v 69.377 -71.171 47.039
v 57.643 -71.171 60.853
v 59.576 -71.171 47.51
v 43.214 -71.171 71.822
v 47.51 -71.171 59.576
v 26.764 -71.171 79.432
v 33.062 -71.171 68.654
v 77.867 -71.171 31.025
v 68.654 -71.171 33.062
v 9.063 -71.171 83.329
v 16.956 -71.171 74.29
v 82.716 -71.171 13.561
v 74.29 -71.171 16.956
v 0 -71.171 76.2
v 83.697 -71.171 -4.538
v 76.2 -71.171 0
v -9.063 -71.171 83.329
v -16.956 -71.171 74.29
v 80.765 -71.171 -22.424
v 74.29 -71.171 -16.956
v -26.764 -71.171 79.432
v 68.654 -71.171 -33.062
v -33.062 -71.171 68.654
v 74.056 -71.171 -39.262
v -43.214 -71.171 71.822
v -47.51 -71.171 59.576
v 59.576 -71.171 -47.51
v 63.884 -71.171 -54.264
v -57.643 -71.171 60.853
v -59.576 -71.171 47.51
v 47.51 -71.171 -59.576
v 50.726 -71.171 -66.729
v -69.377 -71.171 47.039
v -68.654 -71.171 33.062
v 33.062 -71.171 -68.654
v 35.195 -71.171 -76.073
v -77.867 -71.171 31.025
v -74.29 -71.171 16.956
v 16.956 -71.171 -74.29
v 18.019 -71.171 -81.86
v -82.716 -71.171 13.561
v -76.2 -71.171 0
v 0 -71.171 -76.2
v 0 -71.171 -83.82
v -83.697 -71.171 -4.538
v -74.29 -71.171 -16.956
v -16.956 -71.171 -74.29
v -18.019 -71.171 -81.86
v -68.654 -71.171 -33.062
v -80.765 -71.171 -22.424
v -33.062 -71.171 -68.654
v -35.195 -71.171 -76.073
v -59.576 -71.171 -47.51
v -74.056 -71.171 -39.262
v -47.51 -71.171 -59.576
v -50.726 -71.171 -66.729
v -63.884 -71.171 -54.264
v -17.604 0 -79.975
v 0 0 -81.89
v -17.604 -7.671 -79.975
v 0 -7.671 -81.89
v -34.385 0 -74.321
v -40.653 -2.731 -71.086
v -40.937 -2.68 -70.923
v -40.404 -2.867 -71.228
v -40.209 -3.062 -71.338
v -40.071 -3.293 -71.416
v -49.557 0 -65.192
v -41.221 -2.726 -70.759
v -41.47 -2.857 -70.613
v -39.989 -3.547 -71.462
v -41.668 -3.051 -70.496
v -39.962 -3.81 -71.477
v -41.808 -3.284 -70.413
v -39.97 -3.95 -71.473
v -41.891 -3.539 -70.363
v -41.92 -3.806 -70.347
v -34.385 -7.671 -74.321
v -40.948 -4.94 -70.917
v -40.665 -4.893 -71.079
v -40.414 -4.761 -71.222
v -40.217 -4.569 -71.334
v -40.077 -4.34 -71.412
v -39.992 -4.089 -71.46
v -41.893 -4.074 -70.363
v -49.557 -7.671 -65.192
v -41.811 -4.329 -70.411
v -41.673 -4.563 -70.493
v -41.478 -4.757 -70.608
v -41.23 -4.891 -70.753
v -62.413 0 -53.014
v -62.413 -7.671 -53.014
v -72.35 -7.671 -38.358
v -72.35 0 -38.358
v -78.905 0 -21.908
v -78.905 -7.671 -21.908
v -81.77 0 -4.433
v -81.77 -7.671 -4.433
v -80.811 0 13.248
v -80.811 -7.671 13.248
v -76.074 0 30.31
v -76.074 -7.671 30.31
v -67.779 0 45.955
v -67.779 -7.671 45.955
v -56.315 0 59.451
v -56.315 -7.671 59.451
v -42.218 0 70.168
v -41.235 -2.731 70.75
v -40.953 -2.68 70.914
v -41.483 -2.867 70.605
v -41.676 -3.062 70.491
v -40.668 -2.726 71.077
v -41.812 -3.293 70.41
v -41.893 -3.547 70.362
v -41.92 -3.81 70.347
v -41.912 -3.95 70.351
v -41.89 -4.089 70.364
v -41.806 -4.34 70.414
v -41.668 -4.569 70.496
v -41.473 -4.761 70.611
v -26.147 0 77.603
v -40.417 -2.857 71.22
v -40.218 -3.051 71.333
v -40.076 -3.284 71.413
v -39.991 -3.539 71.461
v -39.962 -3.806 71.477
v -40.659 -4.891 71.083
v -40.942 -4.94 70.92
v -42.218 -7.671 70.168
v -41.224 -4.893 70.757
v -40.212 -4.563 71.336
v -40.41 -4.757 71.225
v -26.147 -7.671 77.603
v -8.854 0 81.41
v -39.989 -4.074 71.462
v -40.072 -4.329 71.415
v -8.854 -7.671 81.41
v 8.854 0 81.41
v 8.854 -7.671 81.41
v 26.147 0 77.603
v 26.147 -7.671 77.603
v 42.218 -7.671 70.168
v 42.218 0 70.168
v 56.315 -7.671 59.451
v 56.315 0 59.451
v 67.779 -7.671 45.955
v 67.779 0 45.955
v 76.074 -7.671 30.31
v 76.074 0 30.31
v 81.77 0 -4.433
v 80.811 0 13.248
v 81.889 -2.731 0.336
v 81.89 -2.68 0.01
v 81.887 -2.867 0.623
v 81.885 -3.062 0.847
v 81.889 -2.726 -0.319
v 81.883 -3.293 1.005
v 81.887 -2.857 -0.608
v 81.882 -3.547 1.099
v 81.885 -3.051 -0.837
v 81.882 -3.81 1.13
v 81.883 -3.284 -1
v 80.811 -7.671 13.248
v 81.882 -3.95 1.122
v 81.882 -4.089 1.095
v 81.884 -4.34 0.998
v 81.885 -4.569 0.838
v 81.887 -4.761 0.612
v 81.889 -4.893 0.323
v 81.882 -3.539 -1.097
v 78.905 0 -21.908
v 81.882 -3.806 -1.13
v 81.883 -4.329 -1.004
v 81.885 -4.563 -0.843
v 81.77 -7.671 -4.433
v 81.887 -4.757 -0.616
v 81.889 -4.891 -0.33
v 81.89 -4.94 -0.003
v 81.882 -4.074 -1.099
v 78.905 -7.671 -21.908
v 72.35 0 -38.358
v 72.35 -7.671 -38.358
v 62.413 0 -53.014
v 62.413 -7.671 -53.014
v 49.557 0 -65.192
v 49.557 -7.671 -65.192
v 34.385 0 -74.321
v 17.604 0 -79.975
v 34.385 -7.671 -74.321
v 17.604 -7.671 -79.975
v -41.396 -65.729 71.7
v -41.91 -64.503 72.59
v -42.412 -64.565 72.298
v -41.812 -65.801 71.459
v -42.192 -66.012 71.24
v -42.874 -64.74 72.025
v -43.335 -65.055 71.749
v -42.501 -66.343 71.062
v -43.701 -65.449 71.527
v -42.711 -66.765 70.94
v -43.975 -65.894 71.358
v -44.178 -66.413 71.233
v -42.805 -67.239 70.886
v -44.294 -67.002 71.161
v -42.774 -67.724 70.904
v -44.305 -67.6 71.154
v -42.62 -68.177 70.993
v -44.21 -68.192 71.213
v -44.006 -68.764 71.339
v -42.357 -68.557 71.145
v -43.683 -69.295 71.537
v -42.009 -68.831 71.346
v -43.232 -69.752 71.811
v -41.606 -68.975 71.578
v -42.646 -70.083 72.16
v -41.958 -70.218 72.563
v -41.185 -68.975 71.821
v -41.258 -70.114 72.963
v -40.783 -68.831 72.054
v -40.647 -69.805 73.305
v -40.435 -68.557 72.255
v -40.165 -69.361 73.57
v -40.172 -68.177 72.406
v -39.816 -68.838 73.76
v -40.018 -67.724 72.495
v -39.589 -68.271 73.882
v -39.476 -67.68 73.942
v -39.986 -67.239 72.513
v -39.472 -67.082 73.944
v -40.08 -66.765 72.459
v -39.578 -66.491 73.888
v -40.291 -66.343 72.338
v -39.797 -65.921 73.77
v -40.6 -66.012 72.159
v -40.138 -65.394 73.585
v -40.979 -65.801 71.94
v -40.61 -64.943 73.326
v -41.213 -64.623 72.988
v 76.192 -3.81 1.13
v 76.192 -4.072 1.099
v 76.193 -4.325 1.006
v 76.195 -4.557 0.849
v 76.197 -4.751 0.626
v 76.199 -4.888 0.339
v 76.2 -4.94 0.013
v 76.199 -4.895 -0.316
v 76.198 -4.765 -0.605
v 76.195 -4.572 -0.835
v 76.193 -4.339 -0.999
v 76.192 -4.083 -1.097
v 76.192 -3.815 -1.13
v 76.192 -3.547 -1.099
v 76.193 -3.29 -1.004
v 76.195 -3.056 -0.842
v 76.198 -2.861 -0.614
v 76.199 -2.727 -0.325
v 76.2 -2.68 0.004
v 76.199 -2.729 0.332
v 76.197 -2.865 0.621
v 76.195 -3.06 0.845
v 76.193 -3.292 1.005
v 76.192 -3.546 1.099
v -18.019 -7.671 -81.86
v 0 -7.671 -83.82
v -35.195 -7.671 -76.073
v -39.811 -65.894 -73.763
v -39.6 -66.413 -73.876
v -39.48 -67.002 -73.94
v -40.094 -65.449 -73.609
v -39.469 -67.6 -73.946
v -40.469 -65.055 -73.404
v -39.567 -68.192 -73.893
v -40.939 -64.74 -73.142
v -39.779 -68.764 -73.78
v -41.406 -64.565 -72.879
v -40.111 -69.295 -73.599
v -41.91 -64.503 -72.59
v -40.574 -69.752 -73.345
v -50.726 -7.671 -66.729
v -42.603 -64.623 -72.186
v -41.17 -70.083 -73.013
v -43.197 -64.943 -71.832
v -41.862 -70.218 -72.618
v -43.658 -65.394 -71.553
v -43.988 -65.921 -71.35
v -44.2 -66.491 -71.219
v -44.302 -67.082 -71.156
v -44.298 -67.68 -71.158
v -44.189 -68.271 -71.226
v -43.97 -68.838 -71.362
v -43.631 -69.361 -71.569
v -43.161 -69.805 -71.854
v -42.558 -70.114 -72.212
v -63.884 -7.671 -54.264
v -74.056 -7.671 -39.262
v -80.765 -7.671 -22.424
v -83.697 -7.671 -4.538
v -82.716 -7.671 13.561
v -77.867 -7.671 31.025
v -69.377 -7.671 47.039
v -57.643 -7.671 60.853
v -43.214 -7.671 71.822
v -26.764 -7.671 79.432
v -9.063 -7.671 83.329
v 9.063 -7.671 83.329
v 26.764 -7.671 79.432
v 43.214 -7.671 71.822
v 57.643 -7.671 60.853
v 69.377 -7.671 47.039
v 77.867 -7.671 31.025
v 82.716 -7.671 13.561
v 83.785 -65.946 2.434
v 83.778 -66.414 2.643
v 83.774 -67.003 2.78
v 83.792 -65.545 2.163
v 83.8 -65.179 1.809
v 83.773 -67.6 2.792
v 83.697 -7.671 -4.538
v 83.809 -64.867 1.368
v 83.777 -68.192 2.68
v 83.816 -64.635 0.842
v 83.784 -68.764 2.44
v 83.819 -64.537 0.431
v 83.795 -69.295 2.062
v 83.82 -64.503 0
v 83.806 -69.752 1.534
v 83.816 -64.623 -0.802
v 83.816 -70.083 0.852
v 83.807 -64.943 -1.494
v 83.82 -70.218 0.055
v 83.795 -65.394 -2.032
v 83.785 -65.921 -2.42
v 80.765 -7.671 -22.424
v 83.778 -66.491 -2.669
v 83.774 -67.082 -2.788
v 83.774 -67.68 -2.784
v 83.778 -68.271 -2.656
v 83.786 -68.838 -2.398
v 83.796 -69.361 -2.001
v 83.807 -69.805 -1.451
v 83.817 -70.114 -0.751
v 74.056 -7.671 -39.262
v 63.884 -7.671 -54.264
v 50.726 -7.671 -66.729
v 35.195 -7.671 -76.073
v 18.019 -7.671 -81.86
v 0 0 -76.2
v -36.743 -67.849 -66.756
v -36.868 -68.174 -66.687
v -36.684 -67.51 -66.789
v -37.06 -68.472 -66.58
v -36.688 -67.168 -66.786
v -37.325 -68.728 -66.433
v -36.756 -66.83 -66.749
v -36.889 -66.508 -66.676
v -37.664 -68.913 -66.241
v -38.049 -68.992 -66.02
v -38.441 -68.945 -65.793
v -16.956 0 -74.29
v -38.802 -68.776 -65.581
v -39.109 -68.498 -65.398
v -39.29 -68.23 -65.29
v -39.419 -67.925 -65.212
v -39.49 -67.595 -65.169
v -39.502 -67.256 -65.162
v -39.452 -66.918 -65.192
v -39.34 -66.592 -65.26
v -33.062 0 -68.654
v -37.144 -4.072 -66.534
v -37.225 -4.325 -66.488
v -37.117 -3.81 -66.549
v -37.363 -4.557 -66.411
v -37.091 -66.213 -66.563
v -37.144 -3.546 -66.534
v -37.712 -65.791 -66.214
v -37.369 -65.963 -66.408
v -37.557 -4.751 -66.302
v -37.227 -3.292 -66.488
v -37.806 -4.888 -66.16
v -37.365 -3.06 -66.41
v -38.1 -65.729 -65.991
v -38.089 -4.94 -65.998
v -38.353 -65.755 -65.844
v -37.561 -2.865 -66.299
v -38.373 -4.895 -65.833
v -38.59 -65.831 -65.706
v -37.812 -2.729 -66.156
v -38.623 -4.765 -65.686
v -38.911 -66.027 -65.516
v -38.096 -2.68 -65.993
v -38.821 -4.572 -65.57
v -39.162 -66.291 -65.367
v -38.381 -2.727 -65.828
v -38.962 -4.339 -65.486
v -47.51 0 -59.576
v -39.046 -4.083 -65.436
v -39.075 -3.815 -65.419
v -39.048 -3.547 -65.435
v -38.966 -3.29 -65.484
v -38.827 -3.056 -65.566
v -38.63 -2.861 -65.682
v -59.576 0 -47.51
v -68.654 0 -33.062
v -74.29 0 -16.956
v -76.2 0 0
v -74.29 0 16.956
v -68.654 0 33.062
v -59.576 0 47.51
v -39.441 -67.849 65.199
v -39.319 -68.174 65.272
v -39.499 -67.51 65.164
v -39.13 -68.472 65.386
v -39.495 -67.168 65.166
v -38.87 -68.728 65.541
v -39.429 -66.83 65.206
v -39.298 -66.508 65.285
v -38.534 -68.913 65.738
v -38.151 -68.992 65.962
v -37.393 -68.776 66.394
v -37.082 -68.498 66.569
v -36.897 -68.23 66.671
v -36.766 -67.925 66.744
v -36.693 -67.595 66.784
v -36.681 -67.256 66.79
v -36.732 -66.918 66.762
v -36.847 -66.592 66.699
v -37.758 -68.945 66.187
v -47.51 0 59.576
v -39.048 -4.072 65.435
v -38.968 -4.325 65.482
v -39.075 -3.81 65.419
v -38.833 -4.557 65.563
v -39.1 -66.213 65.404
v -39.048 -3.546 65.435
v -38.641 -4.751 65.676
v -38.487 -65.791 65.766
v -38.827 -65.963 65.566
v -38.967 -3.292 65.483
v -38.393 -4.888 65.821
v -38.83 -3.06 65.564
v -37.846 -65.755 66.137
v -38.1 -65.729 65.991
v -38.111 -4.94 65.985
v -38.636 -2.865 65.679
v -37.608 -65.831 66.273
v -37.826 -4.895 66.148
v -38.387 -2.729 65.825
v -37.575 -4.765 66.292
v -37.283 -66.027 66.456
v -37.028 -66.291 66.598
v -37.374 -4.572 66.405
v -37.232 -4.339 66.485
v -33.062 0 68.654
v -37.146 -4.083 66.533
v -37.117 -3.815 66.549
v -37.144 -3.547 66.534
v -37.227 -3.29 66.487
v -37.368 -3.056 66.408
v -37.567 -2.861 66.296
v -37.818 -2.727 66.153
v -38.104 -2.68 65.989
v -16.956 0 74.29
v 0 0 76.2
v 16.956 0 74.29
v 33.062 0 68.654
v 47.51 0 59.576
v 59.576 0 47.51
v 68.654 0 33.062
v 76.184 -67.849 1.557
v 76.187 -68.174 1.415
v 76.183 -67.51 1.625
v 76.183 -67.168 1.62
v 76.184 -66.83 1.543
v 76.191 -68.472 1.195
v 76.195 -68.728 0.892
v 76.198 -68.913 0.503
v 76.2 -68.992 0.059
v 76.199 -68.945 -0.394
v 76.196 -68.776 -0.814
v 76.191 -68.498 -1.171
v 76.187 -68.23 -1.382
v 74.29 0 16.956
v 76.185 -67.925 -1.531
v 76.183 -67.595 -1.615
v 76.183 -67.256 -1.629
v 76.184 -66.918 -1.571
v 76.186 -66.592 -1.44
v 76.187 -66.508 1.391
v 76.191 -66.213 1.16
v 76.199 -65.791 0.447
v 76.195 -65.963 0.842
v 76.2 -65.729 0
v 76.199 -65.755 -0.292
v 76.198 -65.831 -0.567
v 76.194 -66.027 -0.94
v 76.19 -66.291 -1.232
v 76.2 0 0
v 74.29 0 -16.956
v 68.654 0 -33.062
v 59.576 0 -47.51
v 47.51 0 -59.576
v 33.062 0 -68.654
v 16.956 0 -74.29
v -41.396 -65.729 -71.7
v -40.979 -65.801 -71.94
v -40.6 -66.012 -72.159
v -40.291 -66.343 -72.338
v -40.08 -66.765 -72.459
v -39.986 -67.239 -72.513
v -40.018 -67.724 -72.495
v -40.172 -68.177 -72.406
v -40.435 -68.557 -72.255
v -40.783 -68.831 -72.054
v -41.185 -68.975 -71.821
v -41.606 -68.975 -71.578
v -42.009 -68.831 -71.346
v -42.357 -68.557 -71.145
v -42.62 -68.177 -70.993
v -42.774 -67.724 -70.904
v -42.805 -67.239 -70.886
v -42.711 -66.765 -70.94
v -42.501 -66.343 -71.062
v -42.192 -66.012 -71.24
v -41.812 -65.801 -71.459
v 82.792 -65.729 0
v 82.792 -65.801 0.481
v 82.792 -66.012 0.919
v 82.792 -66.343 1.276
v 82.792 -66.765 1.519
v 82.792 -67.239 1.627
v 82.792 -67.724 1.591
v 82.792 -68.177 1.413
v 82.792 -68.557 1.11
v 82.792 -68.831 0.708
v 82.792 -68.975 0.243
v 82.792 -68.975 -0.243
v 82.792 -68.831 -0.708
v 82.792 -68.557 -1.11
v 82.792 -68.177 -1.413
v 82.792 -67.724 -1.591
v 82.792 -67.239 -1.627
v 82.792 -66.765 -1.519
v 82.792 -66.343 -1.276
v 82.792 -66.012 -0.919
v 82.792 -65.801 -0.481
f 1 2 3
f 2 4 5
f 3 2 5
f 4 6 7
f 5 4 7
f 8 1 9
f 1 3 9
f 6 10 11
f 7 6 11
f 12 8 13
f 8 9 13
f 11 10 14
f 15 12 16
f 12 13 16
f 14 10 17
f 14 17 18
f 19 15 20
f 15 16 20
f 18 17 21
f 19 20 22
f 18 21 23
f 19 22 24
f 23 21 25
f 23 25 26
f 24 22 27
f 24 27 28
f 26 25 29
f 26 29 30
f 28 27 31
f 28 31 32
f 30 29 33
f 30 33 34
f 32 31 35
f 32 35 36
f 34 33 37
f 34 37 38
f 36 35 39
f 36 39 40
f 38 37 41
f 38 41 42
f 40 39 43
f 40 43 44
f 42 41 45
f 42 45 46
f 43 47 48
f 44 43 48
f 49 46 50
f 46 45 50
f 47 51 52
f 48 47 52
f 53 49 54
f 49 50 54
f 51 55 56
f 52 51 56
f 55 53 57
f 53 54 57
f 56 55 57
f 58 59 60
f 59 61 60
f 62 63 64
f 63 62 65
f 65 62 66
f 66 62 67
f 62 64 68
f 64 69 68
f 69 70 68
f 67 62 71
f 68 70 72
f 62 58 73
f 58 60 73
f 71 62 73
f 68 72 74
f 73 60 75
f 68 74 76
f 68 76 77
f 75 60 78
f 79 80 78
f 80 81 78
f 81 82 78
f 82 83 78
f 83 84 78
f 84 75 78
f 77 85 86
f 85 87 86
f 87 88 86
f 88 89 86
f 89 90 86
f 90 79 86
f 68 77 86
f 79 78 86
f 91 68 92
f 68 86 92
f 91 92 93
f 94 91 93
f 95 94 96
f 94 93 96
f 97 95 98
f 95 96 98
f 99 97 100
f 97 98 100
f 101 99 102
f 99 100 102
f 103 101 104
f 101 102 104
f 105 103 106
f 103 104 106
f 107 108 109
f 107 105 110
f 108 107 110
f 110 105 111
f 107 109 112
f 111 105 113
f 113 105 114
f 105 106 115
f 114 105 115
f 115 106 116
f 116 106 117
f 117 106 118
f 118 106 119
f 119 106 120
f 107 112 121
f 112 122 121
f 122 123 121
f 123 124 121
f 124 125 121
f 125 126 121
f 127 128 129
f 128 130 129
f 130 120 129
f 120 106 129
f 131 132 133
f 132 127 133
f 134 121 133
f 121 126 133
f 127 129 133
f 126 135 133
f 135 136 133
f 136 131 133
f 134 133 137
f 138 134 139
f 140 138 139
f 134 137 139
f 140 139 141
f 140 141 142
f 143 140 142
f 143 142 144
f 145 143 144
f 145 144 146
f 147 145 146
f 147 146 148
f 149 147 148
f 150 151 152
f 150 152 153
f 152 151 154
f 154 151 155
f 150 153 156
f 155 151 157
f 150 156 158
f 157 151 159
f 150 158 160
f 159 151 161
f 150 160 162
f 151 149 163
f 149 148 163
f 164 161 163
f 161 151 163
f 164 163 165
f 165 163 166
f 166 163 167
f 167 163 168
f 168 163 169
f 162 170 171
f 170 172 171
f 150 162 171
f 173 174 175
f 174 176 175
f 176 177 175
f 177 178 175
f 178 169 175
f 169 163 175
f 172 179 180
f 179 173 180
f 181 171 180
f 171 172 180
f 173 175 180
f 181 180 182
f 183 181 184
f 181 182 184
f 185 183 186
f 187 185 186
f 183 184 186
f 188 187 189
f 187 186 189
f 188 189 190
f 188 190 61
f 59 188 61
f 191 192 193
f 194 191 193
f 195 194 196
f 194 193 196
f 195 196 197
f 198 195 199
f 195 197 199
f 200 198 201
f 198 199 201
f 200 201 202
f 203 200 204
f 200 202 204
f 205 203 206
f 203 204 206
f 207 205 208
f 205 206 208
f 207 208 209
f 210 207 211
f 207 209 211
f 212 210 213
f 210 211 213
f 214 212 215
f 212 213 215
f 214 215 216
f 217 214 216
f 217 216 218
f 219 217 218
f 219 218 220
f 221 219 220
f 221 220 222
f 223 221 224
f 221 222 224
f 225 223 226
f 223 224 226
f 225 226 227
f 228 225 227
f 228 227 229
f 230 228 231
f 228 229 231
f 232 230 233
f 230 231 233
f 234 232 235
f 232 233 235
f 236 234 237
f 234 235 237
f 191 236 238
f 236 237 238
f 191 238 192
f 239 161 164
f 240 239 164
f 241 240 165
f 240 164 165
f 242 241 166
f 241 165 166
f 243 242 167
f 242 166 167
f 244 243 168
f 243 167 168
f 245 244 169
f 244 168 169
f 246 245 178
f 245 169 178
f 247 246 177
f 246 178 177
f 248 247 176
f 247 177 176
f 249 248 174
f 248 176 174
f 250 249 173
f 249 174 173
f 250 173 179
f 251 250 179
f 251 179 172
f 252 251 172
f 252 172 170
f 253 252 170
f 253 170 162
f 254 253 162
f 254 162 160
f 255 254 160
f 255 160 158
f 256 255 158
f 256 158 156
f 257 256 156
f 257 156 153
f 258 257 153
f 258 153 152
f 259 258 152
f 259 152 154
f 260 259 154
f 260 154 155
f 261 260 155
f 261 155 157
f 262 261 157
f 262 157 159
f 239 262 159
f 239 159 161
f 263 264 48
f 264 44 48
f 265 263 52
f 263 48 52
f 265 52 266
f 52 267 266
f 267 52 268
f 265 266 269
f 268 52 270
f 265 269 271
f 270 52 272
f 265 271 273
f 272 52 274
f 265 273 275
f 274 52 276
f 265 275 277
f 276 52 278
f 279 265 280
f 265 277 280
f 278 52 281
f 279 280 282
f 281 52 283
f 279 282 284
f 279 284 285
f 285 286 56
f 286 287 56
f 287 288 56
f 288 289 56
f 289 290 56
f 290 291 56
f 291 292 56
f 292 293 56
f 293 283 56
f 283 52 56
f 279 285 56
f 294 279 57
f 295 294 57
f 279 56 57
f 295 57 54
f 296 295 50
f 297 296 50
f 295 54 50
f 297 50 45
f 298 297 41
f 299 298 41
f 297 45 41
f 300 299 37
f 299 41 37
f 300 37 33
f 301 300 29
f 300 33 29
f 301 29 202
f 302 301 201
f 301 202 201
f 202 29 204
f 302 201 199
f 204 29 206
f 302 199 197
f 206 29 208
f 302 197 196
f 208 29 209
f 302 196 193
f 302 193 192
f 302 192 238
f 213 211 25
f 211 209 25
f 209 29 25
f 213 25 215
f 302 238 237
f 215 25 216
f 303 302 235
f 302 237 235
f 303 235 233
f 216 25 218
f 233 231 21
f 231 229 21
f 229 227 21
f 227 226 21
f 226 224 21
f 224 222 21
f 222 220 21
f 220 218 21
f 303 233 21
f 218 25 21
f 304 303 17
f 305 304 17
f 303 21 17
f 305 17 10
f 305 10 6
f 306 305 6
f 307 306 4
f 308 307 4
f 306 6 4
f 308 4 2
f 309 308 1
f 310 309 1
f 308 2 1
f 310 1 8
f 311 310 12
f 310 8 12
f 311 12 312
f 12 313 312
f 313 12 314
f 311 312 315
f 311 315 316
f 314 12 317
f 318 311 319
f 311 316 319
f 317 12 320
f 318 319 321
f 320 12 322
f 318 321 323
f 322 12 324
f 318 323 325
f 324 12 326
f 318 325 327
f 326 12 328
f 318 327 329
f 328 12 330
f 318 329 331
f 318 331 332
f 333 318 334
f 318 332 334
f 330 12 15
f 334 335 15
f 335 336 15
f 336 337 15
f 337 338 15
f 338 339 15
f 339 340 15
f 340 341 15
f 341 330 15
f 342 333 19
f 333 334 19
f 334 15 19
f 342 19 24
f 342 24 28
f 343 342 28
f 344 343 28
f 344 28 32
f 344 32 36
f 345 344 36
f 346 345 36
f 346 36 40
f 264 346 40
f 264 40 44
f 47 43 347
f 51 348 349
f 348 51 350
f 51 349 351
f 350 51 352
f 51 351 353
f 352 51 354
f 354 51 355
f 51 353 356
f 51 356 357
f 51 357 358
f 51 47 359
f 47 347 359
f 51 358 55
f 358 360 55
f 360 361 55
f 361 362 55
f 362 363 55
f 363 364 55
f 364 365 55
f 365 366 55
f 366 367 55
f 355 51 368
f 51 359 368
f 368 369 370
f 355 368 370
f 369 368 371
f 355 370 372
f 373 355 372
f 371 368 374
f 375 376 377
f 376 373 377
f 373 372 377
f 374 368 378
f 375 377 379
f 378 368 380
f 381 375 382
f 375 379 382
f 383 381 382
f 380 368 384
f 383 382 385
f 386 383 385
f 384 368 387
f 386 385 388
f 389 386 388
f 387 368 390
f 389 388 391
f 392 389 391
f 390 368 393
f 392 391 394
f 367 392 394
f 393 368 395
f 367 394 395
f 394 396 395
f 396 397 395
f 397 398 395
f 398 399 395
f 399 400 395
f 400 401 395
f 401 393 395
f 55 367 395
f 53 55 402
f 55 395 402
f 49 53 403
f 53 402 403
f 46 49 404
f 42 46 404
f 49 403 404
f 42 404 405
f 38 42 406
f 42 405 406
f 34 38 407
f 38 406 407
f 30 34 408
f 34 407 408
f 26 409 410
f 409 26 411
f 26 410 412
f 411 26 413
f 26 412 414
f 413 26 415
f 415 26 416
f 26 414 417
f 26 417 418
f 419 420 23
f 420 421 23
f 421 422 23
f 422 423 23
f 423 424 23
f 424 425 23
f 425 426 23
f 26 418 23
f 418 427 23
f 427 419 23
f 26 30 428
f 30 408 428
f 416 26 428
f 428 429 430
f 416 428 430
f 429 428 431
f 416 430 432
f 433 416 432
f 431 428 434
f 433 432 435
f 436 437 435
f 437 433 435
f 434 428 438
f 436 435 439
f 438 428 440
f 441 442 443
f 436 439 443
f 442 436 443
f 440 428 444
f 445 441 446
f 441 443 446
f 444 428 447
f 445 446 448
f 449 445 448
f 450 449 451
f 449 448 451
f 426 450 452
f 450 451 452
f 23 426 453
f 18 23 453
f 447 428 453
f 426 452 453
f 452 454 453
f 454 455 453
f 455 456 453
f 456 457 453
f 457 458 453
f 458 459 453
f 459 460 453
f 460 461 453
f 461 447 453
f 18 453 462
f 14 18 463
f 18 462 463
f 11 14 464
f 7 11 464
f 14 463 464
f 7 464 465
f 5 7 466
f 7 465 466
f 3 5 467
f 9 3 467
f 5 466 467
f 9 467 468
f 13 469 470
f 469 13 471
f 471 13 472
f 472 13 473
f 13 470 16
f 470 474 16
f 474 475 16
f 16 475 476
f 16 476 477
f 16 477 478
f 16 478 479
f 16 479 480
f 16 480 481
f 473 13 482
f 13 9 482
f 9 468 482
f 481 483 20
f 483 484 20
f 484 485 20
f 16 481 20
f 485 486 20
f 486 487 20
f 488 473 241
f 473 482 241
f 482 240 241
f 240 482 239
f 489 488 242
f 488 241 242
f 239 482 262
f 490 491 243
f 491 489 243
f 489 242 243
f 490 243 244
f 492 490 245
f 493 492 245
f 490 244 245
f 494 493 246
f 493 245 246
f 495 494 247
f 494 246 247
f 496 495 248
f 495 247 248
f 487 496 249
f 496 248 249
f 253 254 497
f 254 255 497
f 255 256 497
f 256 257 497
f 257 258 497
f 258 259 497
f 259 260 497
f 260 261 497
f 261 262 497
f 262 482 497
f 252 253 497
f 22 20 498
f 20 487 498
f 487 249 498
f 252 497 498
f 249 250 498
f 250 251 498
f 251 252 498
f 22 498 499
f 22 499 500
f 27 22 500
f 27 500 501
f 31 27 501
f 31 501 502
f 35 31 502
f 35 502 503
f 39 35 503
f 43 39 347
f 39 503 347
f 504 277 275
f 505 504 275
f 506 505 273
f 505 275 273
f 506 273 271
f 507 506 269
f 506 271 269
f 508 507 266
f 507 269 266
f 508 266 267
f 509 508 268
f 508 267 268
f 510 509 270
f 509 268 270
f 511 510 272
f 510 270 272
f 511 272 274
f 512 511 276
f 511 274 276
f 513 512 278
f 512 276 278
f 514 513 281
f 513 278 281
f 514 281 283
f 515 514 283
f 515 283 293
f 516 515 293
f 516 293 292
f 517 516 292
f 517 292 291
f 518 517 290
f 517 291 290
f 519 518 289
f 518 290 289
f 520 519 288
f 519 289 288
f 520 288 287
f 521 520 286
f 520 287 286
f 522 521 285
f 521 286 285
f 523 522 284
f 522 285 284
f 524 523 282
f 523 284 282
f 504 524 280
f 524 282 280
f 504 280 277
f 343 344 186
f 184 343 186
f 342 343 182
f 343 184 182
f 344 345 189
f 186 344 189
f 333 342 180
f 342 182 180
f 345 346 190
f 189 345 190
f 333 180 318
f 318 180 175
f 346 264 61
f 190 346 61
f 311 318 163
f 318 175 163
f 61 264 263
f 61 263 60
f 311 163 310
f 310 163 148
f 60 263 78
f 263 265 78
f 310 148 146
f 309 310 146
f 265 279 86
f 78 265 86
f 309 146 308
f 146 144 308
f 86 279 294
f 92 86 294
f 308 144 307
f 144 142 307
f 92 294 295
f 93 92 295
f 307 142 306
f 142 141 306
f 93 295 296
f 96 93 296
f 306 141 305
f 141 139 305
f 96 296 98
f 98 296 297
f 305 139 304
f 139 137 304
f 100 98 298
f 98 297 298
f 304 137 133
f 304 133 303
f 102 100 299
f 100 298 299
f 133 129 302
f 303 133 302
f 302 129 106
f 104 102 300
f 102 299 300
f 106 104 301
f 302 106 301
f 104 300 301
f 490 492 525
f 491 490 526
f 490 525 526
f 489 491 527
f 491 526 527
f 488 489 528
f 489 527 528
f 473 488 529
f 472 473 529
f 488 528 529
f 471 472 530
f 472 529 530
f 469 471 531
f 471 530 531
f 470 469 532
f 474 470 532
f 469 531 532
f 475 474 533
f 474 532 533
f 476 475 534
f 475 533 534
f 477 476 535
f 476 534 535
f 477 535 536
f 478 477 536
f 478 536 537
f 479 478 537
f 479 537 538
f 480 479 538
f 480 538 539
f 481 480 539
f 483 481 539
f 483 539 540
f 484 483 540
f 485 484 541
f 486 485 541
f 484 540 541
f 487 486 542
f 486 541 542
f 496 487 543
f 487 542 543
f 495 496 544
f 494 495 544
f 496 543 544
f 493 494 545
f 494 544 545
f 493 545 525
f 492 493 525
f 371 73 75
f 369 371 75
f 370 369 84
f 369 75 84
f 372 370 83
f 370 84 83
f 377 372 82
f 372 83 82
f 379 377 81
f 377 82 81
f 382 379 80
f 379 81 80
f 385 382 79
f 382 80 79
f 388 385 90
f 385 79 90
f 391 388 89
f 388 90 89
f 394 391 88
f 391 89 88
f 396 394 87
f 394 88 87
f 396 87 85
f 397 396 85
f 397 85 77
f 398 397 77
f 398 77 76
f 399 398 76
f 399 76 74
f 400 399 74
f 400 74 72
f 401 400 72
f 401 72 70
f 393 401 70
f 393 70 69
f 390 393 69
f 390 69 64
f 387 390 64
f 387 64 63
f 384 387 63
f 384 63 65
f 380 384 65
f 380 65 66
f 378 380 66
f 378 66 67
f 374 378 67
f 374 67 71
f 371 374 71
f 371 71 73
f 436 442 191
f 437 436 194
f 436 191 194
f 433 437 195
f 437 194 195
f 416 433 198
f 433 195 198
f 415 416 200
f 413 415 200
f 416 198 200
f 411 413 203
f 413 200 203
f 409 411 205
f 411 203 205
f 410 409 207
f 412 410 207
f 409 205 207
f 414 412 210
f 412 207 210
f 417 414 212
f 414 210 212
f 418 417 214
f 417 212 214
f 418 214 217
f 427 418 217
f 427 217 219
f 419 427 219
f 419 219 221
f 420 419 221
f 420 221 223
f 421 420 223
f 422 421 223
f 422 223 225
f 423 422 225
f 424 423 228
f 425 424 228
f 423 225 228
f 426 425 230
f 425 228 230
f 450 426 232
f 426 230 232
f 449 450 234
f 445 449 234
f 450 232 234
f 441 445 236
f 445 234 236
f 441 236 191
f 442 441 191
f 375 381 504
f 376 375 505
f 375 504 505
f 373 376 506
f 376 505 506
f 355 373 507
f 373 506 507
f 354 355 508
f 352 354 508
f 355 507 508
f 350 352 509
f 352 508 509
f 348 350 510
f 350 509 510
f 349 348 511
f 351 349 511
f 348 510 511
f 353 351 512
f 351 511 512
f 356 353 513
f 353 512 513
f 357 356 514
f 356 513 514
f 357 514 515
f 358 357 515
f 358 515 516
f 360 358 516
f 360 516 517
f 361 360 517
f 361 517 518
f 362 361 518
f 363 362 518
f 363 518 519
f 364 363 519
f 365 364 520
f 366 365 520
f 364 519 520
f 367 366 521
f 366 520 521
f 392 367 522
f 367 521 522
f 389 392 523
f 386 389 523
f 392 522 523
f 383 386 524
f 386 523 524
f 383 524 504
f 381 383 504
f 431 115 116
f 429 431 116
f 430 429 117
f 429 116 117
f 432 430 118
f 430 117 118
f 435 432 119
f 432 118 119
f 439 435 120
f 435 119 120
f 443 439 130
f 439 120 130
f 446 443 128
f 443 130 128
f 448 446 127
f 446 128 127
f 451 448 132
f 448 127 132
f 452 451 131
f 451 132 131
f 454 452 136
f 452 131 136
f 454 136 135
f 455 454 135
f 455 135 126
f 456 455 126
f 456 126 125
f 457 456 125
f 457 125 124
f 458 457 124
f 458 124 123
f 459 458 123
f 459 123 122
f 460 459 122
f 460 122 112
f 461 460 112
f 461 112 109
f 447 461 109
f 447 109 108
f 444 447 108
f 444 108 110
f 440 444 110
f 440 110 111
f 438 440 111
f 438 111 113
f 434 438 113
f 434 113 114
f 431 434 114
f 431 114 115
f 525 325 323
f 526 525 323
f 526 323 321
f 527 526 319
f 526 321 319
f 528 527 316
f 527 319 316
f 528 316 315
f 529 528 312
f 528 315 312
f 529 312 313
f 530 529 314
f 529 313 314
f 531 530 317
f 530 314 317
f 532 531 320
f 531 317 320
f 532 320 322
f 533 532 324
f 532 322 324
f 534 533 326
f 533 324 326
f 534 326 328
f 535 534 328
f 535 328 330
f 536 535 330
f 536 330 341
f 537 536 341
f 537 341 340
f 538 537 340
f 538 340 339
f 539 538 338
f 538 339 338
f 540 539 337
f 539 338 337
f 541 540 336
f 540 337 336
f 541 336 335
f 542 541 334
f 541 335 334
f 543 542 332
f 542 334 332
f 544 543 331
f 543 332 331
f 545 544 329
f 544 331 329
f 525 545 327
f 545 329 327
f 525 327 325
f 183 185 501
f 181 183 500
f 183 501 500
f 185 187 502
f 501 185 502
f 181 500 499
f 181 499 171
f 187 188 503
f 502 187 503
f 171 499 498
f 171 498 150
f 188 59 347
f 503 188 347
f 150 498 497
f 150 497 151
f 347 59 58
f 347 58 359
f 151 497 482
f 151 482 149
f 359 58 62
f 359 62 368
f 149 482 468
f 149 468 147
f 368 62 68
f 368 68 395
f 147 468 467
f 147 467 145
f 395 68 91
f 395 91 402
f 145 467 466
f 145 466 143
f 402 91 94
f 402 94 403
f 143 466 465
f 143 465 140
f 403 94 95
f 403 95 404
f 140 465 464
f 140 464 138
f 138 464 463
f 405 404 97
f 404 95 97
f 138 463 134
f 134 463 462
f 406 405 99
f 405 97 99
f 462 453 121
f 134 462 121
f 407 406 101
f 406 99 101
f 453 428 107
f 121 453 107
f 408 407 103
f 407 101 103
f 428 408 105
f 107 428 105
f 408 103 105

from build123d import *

# Parameters (mm, degrees)
F_4_40_TAPPED_HOLE1_REACH  = 199.542
F_4_40_TAPPED_HOLE1_BORE_R = 1.1303
CIRPATTERN1_COUNT          = 3


# Read off the part's stored shape, not the designer's step: CSK for #4 Flat Head Machine Screw (100)1
with BuildPart() as part:
    # Sketch1 → Revolve1 (revolve)
    with BuildSketch(Plane.XY, mode=Mode.PRIVATE) as revolve1_sk:
        Polygon((-76.2, 0), (-81.8896, 0), (-81.8896, -7.6708), (-83.82, -7.6708), (-83.82, -71.1708), (-76.2, -71.1708), align=None)
    revolve(revolve1_sk.sketch.rotate(Axis((0, 0, 0), (0, 1, 0)), 270), axis=Axis((0, 0, 0), (0, 1, 0)))

    # #4-40 Tapped Hole1 bore (on position points) → #4-40 Tapped Hole1 (cut, up to next)
    with BuildSketch(Plane(origin=(81.8896, -3.81, 0), x_dir=(0, 0, 1), z_dir=(1, 0, 0)), mode=Mode.PRIVATE) as f_4_40_tapped_hole1_sk1:
        Circle(F_4_40_TAPPED_HOLE1_BORE_R)
    f_4_40_tapped_hole1_tool1 = extrude(f_4_40_tapped_hole1_sk1.sketch, amount=-F_4_40_TAPPED_HOLE1_REACH, mode=Mode.PRIVATE) & part.part
    f_4_40_tapped_hole1 = f_4_40_tapped_hole1_tool1.solids().sort_by_distance((81.8896, -3.81, 0))[0]
    add(f_4_40_tapped_hole1, mode=Mode.SUBTRACT)

    # CSK for _4 Flat Head Machine Screw _ 2 → CSK for #4 Flat Head Machine Screw (100)1 (revolve, cut)
    with BuildSketch(Plane(origin=(0, -67.3608, 0), x_dir=(0, 1, 0), z_dir=(0, 0, -1))):
        Polygon((2.857519918, 83.820016713), (0, 83.820016713), (0, 76.182513139), (1.63195, 76.182513139), (1.63195, 82.791641447), align=None)
    csk_for_4_flat_head_machine_screw_100 = revolve(axis=Axis((0, -67.3608, 0), (1, 0, 0)), mode=Mode.SUBTRACT)

    # CirPattern1: #4-40 Tapped Hole1, CSK for #4 Flat Head Machine Screw (100)1 ×3 about axis
    cirpattern1_axis = Axis((0, 0, 0), (0, -1, 0))
    add([f_4_40_tapped_hole1.rotate(cirpattern1_axis, i * 360 / CIRPATTERN1_COUNT) for i in range(1, CIRPATTERN1_COUNT)], mode=Mode.SUBTRACT)
    add([csk_for_4_flat_head_machine_screw_100.rotate(cirpattern1_axis, i * 360 / CIRPATTERN1_COUNT) for i in range(1, CIRPATTERN1_COUNT)], mode=Mode.SUBTRACT)


solid = part.part
